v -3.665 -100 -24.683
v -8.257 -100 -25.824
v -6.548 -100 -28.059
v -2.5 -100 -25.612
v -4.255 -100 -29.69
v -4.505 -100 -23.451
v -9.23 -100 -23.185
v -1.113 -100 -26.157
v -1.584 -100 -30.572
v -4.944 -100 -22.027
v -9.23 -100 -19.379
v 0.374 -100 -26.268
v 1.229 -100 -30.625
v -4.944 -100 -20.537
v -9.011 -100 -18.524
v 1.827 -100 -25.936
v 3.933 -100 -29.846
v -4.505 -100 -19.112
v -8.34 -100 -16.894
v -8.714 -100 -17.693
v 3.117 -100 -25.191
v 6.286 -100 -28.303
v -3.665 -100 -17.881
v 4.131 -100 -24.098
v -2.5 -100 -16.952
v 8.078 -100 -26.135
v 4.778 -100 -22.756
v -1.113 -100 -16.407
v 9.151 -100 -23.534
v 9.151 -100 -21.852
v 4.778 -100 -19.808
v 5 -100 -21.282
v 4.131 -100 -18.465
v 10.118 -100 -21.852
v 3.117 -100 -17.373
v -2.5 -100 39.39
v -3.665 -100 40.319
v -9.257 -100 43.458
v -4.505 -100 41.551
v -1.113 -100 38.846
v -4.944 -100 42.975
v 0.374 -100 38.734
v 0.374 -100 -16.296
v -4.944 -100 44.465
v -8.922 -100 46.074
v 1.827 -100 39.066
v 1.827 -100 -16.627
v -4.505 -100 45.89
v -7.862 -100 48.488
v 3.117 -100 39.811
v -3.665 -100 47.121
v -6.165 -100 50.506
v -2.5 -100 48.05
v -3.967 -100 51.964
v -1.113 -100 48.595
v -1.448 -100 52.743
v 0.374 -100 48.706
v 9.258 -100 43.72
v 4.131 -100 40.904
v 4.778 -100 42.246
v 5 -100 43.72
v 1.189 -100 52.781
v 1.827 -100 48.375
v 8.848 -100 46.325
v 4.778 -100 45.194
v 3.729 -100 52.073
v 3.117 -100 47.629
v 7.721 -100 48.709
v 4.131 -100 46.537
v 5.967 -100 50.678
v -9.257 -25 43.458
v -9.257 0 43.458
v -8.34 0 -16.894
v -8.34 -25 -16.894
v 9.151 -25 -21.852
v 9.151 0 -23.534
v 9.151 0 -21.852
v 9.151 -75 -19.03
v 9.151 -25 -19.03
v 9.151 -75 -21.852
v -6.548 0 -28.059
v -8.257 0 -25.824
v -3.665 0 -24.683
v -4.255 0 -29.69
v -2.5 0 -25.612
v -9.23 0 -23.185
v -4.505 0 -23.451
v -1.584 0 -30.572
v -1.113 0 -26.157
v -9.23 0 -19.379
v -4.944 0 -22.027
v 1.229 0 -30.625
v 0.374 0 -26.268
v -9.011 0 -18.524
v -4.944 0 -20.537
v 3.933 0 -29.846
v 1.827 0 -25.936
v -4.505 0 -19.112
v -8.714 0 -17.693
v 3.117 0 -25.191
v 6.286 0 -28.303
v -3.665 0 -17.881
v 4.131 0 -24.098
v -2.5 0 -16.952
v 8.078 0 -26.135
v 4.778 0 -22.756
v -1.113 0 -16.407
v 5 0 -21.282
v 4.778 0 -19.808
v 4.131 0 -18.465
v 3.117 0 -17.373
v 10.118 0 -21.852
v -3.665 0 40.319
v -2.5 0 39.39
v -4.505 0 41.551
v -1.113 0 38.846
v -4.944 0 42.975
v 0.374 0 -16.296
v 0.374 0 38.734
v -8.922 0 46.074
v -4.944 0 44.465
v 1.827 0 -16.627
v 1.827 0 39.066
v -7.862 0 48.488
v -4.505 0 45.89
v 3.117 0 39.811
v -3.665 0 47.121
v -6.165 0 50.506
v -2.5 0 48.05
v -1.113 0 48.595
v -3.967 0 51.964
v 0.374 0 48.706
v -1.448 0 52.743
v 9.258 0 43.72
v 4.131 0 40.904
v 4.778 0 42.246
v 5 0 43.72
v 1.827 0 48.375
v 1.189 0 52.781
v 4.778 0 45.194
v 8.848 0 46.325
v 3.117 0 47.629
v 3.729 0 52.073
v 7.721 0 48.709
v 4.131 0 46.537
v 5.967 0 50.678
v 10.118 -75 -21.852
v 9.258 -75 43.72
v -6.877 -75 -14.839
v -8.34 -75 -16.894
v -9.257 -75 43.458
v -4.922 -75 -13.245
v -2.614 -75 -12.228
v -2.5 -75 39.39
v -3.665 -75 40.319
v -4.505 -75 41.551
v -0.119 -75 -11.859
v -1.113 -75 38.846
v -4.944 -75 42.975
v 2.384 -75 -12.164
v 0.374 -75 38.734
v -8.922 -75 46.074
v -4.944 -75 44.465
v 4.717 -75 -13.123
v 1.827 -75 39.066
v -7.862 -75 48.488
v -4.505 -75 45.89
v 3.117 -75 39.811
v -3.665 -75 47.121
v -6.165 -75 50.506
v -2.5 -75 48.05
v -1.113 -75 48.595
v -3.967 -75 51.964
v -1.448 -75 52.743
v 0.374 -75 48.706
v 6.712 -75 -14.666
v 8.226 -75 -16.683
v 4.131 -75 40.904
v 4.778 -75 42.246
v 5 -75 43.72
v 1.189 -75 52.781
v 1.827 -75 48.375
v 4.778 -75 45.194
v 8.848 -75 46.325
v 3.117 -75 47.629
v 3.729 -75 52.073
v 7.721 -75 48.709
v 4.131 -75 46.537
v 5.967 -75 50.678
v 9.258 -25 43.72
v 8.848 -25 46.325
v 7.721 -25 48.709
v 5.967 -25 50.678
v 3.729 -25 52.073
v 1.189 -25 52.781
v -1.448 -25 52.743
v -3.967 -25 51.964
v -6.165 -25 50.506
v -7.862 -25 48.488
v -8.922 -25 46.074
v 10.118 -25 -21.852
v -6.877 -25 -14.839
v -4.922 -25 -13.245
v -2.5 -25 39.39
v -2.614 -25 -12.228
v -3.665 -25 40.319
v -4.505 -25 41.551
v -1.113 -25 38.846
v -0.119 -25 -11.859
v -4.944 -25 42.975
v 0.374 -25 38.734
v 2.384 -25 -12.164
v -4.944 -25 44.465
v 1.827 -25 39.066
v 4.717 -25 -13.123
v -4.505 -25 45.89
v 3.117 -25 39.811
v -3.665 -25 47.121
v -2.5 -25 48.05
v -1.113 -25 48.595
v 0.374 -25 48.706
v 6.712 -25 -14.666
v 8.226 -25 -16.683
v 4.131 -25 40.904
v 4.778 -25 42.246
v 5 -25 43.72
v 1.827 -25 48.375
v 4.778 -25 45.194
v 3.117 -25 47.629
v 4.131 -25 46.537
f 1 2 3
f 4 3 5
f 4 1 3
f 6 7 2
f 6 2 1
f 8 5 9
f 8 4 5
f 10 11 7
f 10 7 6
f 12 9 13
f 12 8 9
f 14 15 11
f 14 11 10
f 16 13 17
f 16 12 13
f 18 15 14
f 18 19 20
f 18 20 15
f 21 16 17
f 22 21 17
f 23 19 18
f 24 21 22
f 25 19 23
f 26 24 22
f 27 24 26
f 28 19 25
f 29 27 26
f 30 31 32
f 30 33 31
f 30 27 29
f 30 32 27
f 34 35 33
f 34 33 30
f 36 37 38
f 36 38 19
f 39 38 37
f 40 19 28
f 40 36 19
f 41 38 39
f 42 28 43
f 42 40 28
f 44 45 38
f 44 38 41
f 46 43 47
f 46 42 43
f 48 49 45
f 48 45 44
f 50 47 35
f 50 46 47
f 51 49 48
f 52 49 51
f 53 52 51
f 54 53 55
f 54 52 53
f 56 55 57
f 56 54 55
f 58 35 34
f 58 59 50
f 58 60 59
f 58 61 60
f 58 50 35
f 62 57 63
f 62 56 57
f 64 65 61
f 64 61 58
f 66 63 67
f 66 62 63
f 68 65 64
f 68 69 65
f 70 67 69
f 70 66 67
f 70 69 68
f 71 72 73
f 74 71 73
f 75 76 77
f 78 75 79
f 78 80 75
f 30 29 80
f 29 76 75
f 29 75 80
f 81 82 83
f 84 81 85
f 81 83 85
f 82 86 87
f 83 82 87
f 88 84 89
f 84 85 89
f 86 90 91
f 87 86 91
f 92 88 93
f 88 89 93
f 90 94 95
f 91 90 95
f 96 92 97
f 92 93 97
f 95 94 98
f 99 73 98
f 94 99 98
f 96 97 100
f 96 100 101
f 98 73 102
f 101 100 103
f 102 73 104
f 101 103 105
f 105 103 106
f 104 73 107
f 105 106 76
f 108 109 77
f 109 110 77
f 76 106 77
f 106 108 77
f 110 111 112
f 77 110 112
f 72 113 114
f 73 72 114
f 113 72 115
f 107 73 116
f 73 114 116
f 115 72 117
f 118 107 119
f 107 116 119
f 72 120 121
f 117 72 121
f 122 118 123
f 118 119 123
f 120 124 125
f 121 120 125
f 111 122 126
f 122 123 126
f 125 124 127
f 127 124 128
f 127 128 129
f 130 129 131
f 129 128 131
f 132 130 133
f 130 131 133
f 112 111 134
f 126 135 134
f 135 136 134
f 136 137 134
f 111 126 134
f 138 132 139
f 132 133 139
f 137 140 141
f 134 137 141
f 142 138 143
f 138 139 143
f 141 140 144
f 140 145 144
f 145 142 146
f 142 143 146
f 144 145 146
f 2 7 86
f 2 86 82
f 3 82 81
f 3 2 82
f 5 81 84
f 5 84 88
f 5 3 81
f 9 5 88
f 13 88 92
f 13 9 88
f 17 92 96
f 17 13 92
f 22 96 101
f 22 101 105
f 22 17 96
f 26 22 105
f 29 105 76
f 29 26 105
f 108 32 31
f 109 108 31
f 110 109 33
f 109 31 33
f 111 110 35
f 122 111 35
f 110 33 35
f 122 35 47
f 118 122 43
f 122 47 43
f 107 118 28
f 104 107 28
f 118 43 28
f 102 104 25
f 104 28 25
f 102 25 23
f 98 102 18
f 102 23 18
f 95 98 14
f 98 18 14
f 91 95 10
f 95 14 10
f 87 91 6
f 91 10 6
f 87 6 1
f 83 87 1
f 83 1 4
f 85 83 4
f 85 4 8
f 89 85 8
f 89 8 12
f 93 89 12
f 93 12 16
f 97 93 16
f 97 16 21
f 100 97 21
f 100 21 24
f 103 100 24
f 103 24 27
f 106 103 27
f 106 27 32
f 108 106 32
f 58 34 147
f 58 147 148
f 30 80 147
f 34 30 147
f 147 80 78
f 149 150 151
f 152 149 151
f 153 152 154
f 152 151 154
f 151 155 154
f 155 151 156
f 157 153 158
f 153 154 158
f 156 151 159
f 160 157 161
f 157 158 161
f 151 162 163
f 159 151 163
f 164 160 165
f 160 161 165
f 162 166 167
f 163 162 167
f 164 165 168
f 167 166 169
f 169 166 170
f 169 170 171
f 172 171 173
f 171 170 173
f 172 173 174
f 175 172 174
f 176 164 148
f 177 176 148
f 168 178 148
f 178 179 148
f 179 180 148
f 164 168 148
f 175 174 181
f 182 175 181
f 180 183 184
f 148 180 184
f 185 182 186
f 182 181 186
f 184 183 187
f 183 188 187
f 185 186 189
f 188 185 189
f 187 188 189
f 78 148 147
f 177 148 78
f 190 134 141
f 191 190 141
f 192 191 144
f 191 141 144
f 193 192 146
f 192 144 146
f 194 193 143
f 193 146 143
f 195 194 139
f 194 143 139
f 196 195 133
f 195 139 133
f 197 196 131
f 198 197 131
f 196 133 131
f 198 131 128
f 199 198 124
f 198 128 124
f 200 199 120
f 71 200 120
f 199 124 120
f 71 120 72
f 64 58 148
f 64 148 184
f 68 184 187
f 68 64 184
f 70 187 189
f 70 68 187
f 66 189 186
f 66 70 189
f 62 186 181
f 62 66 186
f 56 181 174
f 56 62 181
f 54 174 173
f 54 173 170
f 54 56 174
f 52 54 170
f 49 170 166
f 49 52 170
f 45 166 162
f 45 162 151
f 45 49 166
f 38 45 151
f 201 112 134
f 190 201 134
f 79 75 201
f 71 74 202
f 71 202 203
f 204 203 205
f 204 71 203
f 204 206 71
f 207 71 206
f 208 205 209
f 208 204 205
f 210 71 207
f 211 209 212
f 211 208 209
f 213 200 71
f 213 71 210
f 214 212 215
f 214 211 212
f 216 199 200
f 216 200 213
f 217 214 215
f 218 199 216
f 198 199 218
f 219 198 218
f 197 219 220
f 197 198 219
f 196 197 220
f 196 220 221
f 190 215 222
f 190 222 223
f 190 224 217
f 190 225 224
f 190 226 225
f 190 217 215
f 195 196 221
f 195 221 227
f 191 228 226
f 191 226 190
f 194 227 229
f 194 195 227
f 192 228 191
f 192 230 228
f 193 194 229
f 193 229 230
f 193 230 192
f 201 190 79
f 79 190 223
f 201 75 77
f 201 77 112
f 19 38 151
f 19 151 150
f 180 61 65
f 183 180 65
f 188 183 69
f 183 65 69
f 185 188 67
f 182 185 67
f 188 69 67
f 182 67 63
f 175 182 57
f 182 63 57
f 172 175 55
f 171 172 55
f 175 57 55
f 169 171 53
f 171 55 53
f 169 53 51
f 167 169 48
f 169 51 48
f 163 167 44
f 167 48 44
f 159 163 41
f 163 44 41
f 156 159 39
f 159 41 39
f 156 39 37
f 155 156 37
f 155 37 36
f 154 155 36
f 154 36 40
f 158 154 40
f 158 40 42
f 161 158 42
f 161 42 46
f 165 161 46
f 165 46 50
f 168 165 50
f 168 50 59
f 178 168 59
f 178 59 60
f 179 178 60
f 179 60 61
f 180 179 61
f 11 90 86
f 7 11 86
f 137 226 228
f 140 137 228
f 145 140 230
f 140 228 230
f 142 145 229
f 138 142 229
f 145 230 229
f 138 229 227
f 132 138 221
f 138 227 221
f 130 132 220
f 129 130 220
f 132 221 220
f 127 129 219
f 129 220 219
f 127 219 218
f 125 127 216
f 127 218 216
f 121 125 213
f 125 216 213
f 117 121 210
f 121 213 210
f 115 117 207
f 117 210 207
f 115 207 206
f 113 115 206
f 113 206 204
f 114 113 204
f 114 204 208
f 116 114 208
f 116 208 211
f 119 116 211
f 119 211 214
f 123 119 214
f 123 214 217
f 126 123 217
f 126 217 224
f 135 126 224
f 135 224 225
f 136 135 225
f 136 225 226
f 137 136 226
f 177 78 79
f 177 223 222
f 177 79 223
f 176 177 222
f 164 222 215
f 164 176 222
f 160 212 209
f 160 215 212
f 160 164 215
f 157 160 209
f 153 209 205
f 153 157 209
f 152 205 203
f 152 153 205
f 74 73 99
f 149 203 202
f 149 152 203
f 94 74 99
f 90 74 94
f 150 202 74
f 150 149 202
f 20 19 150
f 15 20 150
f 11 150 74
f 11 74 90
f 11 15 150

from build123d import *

# Parameters (mm, degrees)
F1_DEPTH = 50
F3_DEPTH = 25
F6_D     = 10


with BuildPart() as f1:
    # F0 (on Front) → F1 (new body)
    with BuildSketch(Plane.XZ):
        with BuildLine():
            Line((-9.229952, -19.379207), (-9.229952, -23.184515))
            ThreePointArc((-9.229952, -23.184515), (-0.179062, -30.704177), (9.150997, -23.533827))
            Line((9.150997, -23.533827), (9.150997, -19.029895))
            ThreePointArc((9.150997, -19.029895), (-0.179062, -11.859545), (-9.229952, -19.379207))
        make_face()
    extrude(amount=F1_DEPTH)

    # F2 (on Front) → F3 (join)
    with BuildSketch(Plane.XZ):
        with BuildLine():
            ThreePointArc((9.257771, 43.720222), (9.258368, 43.659507), (9.258567, 43.59879))
            ThreePointArc((9.258567, 43.59879), (0.070375, 34.34049), (-9.257498, 43.458044))
            Line((-9.257498, 43.458044), (-8.264562, -21.851944))
            Line((-8.264562, -21.851944), (10.117864, -21.851944))
            Line((10.117864, -21.851944), (9.257771, 43.720222))
        make_face()
        with BuildLine():
            ThreePointArc((-9.257498, 43.458044), (0.070375, 34.34049), (9.258567, 43.59879))
            ThreePointArc((9.258567, 43.59879), (9.258368, 43.659507), (9.257771, 43.720222))
            ThreePointArc((9.257771, 43.720222), (-0.131089, 52.856429), (-9.257498, 43.458044))
        make_face()
    extrude(amount=F3_DEPTH)

    # F4: F1 across face


with BuildPart() as f1_1:
    add(f1.part)
    add(f1.part.mirror(Plane(origin=(-0.010882, -50, -21.281861), x_dir=(1, 0, 0), z_dir=(0, -1, 0))))

    # F6 (through all)
    with Locations(Plane(origin=(0, 0, 0), x_dir=(-1, 0, 0), z_dir=(0, 1, 0))):
        with Locations((0, 43.720222), (0, -21.281861)):
            Hole(F6_D / 2)


solid = f1_1.part
